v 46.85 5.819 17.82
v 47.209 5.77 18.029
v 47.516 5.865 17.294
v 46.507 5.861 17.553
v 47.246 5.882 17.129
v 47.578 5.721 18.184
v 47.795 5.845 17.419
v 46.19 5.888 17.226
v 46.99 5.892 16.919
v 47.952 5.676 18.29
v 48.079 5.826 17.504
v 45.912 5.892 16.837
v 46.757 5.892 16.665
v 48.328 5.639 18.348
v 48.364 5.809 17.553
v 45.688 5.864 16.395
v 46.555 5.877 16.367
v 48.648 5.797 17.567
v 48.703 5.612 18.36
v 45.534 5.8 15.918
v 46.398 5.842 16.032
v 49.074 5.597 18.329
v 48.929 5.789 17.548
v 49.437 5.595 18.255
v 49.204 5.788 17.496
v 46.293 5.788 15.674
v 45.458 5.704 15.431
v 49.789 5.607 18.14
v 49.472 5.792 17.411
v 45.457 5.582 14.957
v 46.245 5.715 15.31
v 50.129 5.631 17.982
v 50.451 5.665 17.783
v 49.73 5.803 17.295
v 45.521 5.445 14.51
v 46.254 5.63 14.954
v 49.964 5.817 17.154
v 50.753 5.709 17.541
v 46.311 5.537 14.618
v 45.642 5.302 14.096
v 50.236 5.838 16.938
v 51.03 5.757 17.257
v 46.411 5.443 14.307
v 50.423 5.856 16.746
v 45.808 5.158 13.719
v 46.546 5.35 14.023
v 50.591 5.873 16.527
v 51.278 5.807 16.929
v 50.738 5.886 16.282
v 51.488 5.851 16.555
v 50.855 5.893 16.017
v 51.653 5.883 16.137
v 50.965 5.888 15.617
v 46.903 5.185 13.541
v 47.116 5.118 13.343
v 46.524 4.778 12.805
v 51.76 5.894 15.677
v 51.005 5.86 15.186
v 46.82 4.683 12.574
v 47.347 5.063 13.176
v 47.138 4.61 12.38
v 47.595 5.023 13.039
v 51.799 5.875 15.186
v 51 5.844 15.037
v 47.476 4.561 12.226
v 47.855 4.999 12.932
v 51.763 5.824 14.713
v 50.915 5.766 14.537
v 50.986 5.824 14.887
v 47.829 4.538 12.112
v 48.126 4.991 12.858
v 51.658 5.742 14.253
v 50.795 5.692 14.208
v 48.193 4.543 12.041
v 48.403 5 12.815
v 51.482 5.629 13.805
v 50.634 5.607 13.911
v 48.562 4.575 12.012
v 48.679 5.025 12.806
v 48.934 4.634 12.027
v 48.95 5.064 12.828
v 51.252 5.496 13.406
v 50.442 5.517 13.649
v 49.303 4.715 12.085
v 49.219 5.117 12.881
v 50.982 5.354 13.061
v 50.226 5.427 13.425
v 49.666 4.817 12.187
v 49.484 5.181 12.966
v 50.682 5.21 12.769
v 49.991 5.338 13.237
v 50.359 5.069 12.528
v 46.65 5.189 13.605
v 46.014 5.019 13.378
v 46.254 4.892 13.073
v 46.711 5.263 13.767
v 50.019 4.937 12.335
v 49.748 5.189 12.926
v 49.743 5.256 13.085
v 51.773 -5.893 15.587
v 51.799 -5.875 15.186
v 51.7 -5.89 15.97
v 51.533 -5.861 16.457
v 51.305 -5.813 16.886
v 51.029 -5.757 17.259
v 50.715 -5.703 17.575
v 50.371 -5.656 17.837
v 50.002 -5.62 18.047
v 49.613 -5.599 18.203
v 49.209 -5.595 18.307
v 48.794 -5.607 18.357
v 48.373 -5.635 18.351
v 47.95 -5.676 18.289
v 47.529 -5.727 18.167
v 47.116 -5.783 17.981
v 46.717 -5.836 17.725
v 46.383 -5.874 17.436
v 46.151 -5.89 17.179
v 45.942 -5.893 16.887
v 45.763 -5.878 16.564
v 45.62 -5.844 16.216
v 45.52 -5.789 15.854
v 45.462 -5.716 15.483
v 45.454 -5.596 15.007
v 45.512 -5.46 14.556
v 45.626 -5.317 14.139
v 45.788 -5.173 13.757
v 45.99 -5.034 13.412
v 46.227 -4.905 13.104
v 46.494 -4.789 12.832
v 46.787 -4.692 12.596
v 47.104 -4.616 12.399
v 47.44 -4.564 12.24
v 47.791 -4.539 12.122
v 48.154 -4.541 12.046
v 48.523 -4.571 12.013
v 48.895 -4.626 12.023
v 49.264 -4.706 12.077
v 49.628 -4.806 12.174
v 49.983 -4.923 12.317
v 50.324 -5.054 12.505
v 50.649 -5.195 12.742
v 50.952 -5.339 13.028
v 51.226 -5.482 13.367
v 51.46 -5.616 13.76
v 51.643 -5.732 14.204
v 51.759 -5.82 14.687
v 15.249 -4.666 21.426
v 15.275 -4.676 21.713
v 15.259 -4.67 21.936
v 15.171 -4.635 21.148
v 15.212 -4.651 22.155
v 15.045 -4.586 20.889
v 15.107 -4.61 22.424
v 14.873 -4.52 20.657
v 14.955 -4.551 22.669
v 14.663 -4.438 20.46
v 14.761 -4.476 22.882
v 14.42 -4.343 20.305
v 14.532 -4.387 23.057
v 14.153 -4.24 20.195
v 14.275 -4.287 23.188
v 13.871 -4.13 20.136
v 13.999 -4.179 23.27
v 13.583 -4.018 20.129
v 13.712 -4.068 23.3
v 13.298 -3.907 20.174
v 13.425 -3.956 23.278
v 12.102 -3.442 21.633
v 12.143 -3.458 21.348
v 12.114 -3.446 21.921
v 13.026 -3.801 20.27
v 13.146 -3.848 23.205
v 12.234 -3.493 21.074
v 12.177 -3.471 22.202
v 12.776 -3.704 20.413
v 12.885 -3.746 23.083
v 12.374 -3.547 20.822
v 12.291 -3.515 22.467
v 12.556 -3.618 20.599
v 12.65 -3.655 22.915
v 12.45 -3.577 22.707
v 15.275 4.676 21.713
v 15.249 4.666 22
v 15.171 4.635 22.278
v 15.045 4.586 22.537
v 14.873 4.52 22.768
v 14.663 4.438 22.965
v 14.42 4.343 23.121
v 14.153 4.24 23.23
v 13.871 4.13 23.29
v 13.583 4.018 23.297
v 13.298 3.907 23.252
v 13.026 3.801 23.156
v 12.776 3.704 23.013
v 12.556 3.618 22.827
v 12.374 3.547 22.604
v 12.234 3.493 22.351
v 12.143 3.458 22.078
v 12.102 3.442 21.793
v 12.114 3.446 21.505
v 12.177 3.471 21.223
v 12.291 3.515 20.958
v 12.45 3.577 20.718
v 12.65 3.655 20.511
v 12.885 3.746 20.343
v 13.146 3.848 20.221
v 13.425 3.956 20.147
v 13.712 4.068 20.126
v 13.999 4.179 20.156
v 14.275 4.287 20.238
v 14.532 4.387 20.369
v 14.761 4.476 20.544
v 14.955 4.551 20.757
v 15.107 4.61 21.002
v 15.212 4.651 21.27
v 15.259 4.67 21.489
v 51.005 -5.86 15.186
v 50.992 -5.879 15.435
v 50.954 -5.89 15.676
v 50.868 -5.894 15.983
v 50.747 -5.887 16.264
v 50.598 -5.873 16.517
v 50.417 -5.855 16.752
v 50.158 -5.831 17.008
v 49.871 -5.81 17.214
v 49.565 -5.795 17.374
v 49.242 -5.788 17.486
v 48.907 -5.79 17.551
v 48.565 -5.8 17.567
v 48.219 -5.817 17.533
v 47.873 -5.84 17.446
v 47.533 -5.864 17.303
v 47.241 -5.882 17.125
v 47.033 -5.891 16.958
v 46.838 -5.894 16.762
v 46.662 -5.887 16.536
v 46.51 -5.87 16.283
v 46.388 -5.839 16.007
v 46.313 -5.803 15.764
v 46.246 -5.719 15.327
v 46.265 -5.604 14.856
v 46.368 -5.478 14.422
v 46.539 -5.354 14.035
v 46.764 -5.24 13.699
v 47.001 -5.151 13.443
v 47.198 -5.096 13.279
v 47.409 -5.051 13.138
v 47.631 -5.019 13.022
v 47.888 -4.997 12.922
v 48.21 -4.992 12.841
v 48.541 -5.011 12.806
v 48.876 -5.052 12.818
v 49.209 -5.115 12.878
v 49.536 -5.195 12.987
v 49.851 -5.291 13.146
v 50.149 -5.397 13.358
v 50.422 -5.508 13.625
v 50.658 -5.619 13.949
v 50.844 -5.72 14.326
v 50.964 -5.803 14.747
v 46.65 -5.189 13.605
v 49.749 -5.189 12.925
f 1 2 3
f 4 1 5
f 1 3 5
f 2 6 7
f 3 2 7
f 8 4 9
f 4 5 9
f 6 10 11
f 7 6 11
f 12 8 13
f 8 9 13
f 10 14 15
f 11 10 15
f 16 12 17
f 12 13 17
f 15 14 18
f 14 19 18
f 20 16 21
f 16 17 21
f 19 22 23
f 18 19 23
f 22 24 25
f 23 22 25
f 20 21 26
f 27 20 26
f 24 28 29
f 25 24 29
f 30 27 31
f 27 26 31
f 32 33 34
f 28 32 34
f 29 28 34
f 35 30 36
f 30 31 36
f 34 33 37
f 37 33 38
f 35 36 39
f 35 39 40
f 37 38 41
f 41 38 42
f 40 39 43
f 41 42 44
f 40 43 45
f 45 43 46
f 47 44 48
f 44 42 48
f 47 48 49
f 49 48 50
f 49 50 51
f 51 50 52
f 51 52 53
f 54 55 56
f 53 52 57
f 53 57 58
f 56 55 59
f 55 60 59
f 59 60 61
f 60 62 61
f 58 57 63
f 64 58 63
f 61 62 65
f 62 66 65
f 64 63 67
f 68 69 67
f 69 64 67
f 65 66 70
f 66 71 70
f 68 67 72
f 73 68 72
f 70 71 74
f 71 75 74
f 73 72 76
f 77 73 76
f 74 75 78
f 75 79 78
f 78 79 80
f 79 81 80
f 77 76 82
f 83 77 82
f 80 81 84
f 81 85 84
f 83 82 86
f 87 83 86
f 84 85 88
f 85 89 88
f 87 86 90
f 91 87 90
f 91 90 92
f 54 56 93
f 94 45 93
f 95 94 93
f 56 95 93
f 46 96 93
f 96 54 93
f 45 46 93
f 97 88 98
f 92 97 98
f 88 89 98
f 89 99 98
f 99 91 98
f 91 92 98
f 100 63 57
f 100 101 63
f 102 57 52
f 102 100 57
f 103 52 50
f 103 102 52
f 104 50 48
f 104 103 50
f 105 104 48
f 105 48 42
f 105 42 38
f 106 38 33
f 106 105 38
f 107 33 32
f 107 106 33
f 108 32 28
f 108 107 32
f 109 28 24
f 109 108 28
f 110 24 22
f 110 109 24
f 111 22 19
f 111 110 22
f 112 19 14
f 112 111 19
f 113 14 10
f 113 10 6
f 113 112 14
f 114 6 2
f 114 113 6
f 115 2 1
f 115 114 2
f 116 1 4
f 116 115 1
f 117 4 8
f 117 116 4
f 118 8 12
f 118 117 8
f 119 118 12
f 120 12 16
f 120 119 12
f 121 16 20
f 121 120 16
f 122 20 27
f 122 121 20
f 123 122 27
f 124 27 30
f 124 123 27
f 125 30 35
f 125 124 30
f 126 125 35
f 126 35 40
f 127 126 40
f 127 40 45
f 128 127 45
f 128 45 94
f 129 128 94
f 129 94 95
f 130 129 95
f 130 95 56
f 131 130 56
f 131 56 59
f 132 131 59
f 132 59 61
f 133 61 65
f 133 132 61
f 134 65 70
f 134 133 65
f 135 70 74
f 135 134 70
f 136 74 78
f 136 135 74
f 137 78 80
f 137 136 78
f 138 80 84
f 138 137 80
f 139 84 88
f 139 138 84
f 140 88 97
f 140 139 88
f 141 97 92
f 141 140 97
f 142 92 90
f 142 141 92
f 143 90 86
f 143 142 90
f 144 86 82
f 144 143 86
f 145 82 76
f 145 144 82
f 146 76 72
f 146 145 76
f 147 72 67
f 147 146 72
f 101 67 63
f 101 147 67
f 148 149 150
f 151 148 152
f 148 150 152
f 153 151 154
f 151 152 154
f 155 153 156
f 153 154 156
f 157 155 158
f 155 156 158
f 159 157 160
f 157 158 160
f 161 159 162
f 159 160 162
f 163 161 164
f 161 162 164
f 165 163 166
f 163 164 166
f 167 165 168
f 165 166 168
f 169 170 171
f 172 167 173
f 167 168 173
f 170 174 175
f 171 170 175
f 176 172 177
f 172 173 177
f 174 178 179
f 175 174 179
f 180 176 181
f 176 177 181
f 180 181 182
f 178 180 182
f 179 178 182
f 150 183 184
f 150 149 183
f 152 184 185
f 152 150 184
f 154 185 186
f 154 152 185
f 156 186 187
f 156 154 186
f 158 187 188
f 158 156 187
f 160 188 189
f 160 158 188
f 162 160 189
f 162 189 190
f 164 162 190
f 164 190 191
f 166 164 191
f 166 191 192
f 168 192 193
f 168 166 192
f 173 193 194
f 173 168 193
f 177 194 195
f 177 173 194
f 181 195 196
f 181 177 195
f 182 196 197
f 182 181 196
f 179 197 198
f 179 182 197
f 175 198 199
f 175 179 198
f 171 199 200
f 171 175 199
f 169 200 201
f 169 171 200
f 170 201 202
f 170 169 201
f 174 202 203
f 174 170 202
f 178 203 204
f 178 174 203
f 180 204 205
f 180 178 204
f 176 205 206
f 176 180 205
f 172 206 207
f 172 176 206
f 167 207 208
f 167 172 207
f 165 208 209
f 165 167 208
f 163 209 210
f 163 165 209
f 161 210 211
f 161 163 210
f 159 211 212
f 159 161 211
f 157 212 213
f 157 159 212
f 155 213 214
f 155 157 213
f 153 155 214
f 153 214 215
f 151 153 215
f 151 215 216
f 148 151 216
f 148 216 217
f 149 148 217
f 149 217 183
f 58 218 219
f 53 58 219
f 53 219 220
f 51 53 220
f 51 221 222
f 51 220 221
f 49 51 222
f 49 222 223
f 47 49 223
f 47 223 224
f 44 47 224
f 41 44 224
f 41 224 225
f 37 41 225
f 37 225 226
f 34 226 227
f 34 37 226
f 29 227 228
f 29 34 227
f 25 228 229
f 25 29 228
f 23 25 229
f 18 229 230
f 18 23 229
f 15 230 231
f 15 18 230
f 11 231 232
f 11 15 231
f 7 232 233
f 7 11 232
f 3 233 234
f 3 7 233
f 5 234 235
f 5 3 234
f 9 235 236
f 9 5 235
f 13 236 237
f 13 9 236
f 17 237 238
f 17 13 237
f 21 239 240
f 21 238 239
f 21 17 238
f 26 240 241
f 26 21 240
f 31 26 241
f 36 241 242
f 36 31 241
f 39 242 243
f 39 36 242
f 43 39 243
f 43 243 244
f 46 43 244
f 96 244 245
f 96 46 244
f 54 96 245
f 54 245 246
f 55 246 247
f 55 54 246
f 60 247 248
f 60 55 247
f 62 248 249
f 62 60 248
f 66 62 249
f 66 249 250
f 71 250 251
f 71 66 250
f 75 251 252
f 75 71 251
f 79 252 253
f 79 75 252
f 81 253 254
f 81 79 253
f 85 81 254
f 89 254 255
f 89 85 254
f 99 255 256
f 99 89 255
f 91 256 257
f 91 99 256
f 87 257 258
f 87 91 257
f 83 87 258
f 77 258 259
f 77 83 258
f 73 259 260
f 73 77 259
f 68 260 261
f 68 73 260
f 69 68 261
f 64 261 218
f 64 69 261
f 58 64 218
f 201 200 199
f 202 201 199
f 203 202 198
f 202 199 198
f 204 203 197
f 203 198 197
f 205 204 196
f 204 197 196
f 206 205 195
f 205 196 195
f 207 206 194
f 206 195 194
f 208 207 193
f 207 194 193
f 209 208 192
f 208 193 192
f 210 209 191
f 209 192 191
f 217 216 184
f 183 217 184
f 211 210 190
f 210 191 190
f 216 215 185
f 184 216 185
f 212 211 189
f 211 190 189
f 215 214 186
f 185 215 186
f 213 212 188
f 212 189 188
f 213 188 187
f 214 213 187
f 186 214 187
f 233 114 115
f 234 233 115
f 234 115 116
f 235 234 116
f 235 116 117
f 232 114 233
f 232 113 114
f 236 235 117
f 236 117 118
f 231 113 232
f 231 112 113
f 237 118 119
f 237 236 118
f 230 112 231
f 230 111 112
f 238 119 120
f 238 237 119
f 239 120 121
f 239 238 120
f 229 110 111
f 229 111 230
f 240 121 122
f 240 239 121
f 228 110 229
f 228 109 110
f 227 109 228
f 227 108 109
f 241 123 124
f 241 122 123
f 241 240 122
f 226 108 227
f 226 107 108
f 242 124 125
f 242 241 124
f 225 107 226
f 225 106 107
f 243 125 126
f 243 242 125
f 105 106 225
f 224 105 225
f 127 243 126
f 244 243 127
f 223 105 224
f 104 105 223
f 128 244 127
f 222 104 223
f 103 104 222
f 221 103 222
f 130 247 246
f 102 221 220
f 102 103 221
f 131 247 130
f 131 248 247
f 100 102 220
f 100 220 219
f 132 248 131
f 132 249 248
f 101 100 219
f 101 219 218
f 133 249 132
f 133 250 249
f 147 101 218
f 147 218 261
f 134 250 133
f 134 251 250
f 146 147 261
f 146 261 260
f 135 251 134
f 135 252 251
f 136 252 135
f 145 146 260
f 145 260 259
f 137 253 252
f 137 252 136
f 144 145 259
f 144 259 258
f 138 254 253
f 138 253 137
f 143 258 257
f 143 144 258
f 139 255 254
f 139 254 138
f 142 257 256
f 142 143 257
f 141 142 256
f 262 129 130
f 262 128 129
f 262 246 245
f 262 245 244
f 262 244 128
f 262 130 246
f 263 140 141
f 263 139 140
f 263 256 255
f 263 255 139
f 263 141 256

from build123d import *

# Parameters (mm, degrees)
F0_R     = 3.175
F0_R_2   = 2.38125
F1_DEPTH = 6.35
F0_R_3   = 1.5875
F4_DEPTH = 63.5
F6_DEPTH = 38.1


with BuildPart() as f1:
    # F0 (on Front) → F1 (new body, symmetric)
    with BuildSketch(Plane.XZ):
        with Locations((48.6235208809, 15.1863284409)):
            Circle(F0_R)
        with Locations((48.6235208809, 15.1863284409)):
            Circle(F0_R_2, mode=Mode.SUBTRACT)
    extrude(amount=F1_DEPTH, both=True)


with BuildPart() as f1b:
    # F0 (on Front) → F1, piece 2 (new body, symmetric)
    with BuildSketch(Plane.XZ):
        with Locations((13.6874951422, 21.7128396034)):
            Circle(F0_R_3)
    extrude(amount=F1_DEPTH, both=True)


with BuildPart() as f4_tool:
    # F3 (on face) → F4 (new body, symmetric)
    with BuildSketch(Plane(origin=(47.3973885527, 0, -10.3885295862), x_dir=(0, -1, 0), z_dir=(-0.9768123791, 0, 0.2140971182))):
        with BuildLine():
            add(Edge.make_bspline(
                [(0, 34.7532853484), (1.5378532055, 33.5959036458), (4.4815687566, 31.3875342093), (6.4257674751, 26.8939046891), (4.9897171526, 21.721626127), (1.7671005847, 18.8913922435), (0, 17.6107138395)],
                knots=[0, 0, 0, 0, 0.2558418404, 0.4854903825, 0.725840266, 1, 1, 1, 1], degree=3))
            Line((0, 17.6107138395), (0, 16.6775155813))
            Line((0, 16.6775155813), (13.2649885491, 16.6775155813))
            Line((13.2649885491, 16.6775155813), (13.2649885491, 37.0723327391))
            Line((13.2649885491, 37.0723327391), (0, 37.0723327391))
            Line((0, 37.0723327391), (0, 34.7532853484))
        make_face()
        with BuildLine():
            Line((0, 16.6775155813), (0, 17.6107138395))
            add(Edge.make_bspline(
                [(0, 34.7532853484), (-1.5378532055, 33.5959036458), (-4.4815687566, 31.3875342093), (-6.4257674751, 26.8939046891), (-4.9897171526, 21.721626127), (-1.7671005847, 18.8913922435), (0, 17.6107138395)],
                knots=[0, 0, 0, 0, 0.2558418404, 0.4854903825, 0.725840266, 1, 1, 1, 1], degree=3))
            Line((0, 34.7532853484), (0, 37.0723327391))
            Line((0, 37.0723327391), (-13.2649885491, 37.0723327391))
            Line((-13.2649885491, 37.0723327391), (-13.2649885491, 16.6775155813))
            Line((-13.2649885491, 16.6775155813), (-13.2639063522, 16.6775155813))
            Line((-13.2639063522, 16.6775155813), (0, 16.6775155813))
        make_face()
    extrude(amount=F4_DEPTH, both=True)


with BuildPart() as f1_1:
    add(f1.part)

    # F4: cut by f4_tool
    add(f4_tool.part, mode=Mode.SUBTRACT)


with BuildPart() as f1b_1:
    add(f1b.part)

    # F4: cut by f4_tool
    add(f4_tool.part, mode=Mode.SUBTRACT)

    # F5 (on Top) → F6 (cut, symmetric)
    with BuildSketch(Plane.XY):
        Polygon((22.2920793171, -7.4048238039), (3.2524354756, 0), (0, 0), (0, -11.8425413966), (16.7136751115, -11.8425413966), (22.3890412599, -11.8425413966), align=None)
        Polygon((0, 0), (3.2524354756, 0), (21.9712223362, 7.280037362), (21.9004824758, 10.5176325887), (16.7136751115, 10.5176325887), (0, 10.5176325887), align=None)
    extrude(amount=F6_DEPTH, both=True, mode=Mode.SUBTRACT)


solid = Compound([f1_1.part, f1b_1.part])
